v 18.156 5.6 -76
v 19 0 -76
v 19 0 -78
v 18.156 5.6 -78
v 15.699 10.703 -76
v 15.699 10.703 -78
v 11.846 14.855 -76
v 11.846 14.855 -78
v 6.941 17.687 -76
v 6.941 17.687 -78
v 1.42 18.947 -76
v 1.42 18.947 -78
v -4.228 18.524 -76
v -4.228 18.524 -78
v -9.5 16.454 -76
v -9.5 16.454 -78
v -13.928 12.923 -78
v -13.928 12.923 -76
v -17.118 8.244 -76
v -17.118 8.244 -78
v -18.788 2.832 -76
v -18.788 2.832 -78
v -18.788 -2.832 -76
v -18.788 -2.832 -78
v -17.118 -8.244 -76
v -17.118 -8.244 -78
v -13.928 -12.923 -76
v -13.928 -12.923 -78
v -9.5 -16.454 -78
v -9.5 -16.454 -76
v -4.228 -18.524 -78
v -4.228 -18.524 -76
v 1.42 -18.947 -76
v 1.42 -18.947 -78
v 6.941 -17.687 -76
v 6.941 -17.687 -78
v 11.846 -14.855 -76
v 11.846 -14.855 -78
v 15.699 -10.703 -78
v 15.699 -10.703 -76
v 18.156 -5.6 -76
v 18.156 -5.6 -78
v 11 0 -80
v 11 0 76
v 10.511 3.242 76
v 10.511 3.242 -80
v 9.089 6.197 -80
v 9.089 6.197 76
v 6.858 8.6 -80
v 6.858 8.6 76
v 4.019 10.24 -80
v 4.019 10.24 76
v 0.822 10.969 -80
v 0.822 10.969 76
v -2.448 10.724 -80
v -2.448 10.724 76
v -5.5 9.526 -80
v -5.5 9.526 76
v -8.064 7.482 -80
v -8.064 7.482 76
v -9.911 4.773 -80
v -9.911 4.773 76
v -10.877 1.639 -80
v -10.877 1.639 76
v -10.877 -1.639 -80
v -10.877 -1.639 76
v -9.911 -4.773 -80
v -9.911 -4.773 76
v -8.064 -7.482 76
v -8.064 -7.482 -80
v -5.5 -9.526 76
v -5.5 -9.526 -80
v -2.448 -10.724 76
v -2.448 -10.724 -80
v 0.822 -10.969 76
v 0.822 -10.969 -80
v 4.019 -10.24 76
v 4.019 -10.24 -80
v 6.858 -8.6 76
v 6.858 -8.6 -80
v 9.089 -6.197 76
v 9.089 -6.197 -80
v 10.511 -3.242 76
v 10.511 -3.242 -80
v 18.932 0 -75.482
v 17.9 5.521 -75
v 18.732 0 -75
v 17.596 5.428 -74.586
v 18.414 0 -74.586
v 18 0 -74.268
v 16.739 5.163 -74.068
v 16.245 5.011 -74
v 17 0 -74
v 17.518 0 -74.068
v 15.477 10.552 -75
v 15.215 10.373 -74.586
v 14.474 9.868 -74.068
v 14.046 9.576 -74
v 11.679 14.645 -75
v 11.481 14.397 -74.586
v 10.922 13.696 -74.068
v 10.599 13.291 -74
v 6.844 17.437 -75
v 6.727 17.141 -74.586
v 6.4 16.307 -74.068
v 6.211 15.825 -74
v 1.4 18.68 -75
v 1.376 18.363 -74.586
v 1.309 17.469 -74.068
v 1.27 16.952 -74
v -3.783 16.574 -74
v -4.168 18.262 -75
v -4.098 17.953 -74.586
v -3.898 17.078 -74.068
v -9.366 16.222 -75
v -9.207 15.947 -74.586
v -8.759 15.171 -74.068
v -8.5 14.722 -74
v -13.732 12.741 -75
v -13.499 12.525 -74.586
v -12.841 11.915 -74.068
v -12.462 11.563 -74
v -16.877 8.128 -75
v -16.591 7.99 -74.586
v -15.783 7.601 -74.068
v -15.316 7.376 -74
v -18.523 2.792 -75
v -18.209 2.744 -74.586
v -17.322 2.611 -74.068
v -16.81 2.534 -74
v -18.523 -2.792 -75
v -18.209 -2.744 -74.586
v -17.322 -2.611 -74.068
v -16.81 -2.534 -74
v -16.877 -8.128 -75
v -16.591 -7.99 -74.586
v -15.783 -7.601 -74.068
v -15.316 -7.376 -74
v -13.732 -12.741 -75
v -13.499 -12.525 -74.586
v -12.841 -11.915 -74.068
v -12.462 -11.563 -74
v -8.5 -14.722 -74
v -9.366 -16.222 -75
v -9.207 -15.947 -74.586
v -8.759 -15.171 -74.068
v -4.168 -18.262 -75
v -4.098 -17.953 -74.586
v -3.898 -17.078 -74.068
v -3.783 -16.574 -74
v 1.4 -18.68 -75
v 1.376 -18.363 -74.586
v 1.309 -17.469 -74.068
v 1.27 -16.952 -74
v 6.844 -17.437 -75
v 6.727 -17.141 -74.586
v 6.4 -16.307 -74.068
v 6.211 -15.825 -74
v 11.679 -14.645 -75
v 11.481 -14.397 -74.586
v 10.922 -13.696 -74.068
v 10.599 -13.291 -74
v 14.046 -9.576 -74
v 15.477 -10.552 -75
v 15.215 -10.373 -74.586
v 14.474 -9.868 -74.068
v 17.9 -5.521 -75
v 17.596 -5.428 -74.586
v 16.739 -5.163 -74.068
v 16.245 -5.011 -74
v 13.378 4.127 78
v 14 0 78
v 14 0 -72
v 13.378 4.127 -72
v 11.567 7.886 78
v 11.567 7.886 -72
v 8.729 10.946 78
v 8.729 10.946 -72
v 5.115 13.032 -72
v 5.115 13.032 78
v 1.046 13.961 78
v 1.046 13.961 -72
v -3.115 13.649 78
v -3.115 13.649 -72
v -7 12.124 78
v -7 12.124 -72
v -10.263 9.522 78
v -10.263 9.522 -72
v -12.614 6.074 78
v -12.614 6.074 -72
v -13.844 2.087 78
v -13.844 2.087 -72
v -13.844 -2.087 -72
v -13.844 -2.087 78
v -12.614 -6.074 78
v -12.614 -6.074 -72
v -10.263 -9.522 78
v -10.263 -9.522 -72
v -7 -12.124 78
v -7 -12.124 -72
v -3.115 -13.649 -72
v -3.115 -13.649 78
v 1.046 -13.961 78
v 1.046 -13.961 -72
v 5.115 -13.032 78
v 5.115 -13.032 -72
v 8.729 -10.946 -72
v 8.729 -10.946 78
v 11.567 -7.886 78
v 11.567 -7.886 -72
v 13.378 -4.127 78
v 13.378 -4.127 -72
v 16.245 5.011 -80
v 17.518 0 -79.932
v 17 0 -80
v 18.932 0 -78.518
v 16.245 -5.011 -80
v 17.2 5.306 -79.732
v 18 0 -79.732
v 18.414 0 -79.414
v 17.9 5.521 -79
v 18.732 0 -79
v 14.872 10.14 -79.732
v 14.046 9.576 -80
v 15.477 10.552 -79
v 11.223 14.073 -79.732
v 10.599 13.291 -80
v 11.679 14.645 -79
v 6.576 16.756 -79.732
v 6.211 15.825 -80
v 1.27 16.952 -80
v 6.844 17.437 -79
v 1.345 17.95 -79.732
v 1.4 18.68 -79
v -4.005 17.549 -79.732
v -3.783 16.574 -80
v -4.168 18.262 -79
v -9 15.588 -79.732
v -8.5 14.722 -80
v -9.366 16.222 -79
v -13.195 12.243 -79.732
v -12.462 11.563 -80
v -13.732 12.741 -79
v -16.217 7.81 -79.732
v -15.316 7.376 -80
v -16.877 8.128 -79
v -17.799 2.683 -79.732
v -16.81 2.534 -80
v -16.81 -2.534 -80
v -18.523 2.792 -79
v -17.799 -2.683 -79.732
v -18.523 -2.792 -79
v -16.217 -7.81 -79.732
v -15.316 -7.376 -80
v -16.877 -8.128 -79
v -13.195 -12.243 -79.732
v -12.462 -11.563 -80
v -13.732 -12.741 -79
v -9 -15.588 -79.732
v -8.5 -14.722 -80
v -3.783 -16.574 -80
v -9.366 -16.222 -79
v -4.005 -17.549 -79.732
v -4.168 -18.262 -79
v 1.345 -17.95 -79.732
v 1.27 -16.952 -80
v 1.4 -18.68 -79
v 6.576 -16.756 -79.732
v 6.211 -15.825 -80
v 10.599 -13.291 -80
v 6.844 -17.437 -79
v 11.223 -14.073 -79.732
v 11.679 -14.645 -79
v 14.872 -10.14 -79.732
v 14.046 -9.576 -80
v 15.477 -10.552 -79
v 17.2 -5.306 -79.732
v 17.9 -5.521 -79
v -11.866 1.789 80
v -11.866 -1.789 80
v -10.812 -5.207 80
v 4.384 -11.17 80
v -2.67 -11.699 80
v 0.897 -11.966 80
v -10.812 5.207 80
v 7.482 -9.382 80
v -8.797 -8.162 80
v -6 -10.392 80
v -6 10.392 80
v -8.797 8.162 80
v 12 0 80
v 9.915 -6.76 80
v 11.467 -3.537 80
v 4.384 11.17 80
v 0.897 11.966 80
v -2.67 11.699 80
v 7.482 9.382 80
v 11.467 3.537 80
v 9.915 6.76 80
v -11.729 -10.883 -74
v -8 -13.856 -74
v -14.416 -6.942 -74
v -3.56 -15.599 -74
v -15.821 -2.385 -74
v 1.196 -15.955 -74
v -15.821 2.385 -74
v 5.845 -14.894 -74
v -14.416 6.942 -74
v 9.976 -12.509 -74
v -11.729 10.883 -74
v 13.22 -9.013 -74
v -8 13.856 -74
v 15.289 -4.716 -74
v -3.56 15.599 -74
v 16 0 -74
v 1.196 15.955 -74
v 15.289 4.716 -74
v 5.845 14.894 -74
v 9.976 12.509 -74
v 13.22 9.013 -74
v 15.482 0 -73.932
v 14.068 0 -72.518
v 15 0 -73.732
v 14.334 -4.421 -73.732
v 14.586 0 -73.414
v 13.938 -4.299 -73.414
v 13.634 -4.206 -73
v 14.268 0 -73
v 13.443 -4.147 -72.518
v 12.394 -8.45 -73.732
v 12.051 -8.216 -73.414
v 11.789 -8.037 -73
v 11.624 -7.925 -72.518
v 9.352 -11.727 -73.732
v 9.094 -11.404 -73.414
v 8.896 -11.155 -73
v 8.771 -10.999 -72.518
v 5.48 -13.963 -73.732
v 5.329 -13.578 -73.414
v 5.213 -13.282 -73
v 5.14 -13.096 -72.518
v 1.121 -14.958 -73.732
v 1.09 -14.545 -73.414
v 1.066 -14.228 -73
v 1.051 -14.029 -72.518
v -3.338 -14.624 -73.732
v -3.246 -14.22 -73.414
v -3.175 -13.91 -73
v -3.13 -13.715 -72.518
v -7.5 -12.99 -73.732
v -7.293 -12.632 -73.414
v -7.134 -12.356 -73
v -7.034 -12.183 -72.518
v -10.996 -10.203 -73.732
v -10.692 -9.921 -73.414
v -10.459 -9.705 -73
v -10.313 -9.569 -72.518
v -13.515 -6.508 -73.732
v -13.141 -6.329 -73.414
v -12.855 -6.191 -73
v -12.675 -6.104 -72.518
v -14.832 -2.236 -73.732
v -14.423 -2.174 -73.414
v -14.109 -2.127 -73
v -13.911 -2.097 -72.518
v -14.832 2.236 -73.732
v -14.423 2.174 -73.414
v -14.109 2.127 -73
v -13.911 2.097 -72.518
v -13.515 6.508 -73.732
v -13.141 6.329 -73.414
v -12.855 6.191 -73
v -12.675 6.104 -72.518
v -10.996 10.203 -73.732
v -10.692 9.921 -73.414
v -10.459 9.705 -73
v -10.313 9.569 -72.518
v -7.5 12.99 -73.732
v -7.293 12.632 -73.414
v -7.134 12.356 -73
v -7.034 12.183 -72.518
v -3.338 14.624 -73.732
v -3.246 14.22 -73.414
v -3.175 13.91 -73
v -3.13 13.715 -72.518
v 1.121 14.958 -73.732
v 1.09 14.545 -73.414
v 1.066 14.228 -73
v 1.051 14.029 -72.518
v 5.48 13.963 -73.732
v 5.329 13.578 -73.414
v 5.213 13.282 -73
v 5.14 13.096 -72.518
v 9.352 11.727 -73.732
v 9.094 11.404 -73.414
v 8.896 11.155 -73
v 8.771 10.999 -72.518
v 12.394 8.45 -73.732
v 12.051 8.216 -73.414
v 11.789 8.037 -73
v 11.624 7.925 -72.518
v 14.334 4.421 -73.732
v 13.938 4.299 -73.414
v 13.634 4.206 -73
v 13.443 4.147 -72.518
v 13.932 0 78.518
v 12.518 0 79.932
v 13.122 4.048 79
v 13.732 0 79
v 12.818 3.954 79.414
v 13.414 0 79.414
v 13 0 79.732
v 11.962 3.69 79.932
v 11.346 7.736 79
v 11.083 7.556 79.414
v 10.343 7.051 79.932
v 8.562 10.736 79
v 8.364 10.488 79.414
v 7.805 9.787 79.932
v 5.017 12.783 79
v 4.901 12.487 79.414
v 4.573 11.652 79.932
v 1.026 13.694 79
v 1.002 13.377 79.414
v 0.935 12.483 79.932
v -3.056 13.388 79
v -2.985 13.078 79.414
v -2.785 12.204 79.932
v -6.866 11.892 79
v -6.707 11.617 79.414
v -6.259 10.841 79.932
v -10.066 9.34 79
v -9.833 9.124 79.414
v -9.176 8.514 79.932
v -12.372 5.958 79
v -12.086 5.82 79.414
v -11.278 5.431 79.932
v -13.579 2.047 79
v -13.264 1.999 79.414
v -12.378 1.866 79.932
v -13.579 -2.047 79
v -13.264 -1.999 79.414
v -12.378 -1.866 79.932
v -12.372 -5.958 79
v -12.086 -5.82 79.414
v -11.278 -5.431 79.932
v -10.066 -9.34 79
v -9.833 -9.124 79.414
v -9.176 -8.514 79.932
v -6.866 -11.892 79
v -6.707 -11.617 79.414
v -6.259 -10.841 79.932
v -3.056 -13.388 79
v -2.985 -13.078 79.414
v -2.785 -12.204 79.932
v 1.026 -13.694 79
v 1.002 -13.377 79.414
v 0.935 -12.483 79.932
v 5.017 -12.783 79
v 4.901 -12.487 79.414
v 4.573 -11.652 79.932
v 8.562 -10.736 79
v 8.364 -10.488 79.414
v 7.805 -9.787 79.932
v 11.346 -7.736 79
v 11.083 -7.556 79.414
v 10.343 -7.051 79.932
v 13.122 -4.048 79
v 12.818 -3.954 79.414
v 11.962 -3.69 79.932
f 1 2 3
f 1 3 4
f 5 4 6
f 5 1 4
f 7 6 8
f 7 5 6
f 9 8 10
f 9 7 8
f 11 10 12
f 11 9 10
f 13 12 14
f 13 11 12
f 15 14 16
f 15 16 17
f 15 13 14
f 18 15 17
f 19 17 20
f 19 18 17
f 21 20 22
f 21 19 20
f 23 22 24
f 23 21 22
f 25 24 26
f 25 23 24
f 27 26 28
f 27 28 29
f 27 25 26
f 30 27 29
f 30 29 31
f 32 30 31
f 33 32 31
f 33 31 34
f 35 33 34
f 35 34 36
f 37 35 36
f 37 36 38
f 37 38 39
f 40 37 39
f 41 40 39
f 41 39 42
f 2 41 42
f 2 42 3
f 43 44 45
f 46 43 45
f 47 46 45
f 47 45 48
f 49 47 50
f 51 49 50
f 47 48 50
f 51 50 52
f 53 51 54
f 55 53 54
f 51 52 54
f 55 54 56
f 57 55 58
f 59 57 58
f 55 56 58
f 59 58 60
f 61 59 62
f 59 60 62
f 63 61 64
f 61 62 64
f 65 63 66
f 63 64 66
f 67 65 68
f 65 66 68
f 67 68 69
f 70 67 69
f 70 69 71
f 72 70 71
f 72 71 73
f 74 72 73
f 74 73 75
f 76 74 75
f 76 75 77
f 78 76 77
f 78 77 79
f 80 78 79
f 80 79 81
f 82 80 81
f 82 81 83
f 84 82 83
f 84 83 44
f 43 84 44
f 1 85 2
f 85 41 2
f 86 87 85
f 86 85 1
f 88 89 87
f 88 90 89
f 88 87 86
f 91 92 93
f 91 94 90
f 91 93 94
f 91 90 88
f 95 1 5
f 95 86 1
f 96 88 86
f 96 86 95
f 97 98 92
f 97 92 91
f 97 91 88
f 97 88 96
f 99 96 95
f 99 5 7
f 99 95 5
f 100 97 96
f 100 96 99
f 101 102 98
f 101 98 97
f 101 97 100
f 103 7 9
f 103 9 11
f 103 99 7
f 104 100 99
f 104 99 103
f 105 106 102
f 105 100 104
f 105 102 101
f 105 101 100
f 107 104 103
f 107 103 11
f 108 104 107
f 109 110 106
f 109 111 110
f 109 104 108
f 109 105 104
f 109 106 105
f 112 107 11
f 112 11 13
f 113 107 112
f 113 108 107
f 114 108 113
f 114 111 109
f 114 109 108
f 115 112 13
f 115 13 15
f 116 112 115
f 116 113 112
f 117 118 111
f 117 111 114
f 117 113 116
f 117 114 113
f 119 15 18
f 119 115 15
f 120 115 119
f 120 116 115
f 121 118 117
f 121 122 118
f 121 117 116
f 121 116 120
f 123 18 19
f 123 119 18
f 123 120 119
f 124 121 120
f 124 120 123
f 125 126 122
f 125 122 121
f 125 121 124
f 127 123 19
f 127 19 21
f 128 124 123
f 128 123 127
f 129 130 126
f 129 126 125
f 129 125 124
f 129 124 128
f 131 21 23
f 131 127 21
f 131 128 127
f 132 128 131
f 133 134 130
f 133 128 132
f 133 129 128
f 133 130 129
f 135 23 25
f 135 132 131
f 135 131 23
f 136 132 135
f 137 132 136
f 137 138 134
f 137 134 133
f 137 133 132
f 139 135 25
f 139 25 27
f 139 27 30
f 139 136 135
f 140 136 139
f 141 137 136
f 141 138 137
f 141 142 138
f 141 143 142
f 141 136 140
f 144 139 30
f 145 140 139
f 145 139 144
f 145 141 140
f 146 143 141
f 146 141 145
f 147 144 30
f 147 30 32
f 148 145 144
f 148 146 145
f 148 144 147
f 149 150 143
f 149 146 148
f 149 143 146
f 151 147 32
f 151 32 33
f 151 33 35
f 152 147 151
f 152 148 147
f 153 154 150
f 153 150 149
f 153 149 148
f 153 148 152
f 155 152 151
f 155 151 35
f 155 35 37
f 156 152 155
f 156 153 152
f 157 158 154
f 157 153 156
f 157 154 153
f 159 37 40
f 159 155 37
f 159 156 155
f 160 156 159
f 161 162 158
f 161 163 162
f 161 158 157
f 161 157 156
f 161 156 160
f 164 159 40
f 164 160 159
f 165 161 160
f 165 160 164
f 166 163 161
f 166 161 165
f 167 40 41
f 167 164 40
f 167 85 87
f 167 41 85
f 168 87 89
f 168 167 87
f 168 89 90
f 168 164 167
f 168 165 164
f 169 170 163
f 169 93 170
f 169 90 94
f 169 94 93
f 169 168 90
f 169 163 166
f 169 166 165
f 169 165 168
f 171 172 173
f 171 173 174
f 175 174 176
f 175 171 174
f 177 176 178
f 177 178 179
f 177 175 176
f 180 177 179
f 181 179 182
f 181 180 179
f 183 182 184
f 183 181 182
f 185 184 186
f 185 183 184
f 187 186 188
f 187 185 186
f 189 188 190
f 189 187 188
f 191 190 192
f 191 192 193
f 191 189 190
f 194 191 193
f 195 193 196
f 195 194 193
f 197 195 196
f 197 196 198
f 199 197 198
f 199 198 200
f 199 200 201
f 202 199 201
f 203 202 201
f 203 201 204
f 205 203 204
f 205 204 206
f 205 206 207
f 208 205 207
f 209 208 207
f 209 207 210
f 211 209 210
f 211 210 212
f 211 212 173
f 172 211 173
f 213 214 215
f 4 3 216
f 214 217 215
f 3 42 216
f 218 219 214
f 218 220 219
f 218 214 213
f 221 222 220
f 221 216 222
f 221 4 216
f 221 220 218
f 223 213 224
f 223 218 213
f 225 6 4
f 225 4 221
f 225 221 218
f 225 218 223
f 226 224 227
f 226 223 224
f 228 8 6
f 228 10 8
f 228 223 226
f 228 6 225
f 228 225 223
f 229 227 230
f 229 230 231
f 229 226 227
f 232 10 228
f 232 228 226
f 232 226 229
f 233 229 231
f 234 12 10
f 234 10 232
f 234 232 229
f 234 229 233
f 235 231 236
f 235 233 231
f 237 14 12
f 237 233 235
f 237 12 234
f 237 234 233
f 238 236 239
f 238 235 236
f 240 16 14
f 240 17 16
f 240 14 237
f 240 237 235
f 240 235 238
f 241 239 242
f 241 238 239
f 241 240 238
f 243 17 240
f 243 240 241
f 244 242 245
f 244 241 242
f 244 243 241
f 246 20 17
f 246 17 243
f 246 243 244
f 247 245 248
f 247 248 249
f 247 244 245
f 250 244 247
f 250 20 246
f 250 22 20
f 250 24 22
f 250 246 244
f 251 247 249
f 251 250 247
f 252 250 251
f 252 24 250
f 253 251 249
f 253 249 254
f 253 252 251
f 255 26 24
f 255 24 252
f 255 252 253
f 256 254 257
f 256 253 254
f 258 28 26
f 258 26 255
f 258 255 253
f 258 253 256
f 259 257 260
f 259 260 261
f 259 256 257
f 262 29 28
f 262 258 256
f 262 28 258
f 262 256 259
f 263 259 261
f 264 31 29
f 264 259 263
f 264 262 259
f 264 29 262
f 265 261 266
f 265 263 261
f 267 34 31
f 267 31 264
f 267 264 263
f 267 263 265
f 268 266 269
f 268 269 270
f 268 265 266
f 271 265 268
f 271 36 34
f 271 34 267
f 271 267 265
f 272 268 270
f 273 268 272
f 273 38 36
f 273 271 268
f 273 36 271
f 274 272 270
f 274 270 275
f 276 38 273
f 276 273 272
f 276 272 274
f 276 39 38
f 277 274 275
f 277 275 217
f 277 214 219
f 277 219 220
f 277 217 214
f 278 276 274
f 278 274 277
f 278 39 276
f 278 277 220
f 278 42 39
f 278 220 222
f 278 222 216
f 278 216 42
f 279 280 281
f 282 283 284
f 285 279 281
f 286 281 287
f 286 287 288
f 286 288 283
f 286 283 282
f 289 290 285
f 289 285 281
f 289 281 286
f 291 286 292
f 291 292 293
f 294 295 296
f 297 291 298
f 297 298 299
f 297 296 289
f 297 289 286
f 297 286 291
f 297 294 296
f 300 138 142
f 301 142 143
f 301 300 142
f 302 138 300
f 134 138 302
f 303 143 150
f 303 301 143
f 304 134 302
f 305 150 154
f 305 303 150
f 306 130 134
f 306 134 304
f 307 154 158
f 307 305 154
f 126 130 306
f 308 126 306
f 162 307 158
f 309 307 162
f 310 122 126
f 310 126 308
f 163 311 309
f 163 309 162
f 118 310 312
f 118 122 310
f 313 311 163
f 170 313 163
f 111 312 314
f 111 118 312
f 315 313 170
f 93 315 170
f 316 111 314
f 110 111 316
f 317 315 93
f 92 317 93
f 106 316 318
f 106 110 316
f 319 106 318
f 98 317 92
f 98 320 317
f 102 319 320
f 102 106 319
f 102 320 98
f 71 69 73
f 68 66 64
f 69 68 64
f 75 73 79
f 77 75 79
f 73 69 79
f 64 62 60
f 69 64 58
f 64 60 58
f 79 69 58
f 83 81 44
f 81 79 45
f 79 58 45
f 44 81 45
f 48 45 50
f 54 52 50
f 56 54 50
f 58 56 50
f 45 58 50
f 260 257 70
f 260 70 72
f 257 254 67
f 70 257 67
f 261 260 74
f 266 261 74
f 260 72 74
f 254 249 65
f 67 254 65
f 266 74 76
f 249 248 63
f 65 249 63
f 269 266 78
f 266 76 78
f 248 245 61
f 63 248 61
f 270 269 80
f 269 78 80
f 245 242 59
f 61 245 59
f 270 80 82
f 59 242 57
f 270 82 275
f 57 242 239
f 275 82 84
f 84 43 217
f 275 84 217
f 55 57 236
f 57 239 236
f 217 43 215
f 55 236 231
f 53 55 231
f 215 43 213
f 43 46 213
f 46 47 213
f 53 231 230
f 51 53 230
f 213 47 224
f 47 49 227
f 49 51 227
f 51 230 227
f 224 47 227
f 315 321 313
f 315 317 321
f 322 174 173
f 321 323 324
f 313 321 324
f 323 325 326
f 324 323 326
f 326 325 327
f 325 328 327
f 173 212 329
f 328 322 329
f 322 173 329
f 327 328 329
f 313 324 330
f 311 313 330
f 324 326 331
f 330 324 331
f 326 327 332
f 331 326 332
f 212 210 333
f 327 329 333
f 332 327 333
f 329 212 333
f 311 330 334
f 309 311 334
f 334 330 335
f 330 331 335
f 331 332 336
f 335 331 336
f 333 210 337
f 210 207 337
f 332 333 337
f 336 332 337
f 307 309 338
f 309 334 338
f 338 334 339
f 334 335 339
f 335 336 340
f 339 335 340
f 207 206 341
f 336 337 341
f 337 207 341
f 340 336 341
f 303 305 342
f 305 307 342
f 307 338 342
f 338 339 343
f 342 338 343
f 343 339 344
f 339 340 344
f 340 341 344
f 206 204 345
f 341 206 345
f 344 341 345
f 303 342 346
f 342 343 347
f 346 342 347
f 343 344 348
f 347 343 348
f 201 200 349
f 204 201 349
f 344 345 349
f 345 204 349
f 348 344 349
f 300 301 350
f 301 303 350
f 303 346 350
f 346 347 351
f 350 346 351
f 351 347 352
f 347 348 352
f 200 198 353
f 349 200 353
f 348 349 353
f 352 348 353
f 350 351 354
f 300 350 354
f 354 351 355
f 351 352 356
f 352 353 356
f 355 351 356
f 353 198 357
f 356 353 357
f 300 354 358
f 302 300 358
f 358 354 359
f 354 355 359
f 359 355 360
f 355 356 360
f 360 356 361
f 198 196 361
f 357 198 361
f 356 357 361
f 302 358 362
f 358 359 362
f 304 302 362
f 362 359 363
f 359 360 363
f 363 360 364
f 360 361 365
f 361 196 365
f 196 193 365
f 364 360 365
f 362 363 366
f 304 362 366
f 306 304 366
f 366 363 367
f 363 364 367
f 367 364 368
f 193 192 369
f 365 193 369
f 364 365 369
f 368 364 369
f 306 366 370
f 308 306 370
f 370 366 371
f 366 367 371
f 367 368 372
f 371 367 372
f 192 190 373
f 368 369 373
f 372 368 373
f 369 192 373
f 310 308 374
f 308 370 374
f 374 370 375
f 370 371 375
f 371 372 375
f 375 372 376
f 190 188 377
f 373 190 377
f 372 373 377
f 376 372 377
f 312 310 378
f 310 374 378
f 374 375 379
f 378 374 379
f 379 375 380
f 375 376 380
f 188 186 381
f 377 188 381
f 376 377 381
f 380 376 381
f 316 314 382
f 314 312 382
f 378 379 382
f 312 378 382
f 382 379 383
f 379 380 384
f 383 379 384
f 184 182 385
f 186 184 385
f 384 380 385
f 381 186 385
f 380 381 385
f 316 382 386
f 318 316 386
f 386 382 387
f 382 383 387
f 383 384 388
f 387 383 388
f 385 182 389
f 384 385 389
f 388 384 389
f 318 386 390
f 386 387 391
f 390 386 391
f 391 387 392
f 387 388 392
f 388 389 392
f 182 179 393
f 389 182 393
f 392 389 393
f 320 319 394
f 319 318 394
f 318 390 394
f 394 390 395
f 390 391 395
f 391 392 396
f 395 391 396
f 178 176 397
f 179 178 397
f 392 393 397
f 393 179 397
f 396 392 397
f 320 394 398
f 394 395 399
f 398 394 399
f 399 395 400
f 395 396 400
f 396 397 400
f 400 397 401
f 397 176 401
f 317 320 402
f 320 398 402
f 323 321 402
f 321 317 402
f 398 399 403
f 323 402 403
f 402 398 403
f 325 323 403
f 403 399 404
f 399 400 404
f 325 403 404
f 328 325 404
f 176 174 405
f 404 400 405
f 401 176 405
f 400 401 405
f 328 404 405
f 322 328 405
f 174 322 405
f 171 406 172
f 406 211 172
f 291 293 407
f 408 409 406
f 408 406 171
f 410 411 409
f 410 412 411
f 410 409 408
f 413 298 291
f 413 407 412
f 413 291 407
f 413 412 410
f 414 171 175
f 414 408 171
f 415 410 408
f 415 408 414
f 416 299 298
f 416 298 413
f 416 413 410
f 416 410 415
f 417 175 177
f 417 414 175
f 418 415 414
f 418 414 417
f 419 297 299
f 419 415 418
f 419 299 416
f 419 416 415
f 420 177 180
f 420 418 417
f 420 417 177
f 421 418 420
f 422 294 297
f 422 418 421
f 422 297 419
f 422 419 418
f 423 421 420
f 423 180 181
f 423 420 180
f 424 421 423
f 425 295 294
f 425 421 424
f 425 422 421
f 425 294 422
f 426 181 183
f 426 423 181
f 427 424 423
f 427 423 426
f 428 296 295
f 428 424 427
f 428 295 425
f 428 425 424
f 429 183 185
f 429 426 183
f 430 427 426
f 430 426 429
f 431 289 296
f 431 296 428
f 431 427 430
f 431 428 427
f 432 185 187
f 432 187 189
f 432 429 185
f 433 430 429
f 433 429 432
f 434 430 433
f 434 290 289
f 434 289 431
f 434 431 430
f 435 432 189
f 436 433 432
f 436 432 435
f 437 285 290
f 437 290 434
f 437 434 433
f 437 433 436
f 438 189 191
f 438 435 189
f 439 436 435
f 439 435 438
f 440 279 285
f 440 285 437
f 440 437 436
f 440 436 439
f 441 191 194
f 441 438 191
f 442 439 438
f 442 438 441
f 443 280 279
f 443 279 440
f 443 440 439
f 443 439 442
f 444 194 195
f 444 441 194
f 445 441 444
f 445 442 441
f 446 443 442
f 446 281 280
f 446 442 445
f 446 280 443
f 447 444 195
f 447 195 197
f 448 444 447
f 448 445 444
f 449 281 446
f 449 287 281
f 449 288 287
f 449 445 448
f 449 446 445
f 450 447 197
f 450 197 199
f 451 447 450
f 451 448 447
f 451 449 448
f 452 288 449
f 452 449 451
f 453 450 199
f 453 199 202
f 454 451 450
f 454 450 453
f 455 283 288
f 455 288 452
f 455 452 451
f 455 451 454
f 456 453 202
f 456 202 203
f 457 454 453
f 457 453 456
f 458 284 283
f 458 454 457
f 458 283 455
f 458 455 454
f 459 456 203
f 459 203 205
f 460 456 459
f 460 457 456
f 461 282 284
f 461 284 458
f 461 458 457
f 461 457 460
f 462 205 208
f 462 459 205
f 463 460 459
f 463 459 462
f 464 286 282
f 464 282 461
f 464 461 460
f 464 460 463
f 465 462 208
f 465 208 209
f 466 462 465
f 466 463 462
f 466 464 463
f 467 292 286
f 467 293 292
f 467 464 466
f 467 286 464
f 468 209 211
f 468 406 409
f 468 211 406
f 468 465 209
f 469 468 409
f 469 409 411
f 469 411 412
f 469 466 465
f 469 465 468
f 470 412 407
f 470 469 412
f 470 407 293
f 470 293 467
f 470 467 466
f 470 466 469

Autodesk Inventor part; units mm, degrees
ref_plane "YZ Plane" through (0, 0, 0) normal (1, 0, 0) x (0, 1, 0)
ref_plane "XZ Plane" through (0, 0, 0) normal (0, 1, 0) x (-1, 0, 0)
ref_plane "XY Plane" through (0, 0, 0) normal (0, 0, 1) x (1, 0, 0)
sketch "Sketch1" plane through (0, 0, 0) normal (0, 1, 0) x (-1, 0, 0)
  line L0 (3.8, 0) -> (-22.8, 0) projected
  line L1 (0, -147.7698) -> (0, 222.7404) projected
  line L2 (-11, -80) -> (-19, -80)
  line L3 (-19, -80) -> (-19, -74)
  line L4 (-19, -74) -> (-14, -74)
  line L5 (-14, -74) -> (-14, 80)
  line L6 (-14, 80) -> (0, 80)
  line L7 (-11, -94.8398) -> (-11, 169.8104) construction
  line L8 (-11, -80) -> (-11, 76)
  line L9 (-11, 76) -> (0, 76)
  dimension "d0" = 38
  dimension "d1" = 28
  dimension "d3" = 22
  dimension "d4" = 160
  dimension "d5" = 6
  dimension "d7" = 4
revolve "Revolution1" add sketch "Sketch1" angle 360 about axis through (0, 0, -10) along (0, 0, 1) contours L8 L2 L3 L4 L5 L0 | L0 L5 L6 L1 L9 L8
fillet "Fillet1" radius 2 4 edges at (-19, 0, -74) (-14, 0, -74) (-14, 0, 80) (-19, 0, -80)
properties part number "Handle bars handles"
